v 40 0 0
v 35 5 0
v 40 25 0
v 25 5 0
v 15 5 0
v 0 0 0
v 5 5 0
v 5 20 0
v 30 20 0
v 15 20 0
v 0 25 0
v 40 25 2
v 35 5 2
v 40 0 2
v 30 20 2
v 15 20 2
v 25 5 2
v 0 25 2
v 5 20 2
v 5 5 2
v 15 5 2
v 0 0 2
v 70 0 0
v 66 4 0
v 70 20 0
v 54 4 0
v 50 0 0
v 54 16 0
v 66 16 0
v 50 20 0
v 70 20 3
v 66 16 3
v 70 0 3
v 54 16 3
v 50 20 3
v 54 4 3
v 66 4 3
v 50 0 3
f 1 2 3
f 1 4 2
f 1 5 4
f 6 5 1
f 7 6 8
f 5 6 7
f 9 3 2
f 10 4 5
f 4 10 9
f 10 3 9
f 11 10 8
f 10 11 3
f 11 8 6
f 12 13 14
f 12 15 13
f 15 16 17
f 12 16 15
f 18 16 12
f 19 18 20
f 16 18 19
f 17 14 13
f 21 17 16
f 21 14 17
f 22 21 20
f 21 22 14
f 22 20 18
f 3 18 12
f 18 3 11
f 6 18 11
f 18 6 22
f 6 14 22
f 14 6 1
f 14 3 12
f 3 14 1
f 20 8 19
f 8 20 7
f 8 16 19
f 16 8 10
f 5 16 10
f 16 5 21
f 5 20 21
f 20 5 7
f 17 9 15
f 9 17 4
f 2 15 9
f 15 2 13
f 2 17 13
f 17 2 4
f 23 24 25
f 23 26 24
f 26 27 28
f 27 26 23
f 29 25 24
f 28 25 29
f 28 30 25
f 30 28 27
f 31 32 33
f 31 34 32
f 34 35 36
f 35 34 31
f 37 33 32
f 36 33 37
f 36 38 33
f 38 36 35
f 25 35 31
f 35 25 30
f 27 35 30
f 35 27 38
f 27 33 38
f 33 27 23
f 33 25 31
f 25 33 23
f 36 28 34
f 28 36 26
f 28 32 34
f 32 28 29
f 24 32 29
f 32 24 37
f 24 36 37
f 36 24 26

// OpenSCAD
// Zweck: polygon mit Löchern über paths – Lochblech/Schild mit zwei Fenstern, extrudiert.
pts = [
    [0, 0], [40, 0], [40, 25], [0, 25],      // außen
    [5, 5], [15, 5], [15, 20], [5, 20],      // Fenster 1
    [25, 5], [35, 5], [30, 20]               // Fenster 2 (Dreieck)
];
linear_extrude(height = 2) polygon(points = pts, paths = [[0, 1, 2, 3], [4, 5, 6, 7], [8, 9, 10]]);
// Zweites Teil: Rahmen aus zwei Pfaden ohne Benennung
translate([50, 0, 0]) linear_extrude(3)
    polygon([[0, 0], [20, 0], [20, 20], [0, 20], [4, 4], [16, 4], [16, 16], [4, 16]],
            [[0, 1, 2, 3], [4, 5, 6, 7]]);
